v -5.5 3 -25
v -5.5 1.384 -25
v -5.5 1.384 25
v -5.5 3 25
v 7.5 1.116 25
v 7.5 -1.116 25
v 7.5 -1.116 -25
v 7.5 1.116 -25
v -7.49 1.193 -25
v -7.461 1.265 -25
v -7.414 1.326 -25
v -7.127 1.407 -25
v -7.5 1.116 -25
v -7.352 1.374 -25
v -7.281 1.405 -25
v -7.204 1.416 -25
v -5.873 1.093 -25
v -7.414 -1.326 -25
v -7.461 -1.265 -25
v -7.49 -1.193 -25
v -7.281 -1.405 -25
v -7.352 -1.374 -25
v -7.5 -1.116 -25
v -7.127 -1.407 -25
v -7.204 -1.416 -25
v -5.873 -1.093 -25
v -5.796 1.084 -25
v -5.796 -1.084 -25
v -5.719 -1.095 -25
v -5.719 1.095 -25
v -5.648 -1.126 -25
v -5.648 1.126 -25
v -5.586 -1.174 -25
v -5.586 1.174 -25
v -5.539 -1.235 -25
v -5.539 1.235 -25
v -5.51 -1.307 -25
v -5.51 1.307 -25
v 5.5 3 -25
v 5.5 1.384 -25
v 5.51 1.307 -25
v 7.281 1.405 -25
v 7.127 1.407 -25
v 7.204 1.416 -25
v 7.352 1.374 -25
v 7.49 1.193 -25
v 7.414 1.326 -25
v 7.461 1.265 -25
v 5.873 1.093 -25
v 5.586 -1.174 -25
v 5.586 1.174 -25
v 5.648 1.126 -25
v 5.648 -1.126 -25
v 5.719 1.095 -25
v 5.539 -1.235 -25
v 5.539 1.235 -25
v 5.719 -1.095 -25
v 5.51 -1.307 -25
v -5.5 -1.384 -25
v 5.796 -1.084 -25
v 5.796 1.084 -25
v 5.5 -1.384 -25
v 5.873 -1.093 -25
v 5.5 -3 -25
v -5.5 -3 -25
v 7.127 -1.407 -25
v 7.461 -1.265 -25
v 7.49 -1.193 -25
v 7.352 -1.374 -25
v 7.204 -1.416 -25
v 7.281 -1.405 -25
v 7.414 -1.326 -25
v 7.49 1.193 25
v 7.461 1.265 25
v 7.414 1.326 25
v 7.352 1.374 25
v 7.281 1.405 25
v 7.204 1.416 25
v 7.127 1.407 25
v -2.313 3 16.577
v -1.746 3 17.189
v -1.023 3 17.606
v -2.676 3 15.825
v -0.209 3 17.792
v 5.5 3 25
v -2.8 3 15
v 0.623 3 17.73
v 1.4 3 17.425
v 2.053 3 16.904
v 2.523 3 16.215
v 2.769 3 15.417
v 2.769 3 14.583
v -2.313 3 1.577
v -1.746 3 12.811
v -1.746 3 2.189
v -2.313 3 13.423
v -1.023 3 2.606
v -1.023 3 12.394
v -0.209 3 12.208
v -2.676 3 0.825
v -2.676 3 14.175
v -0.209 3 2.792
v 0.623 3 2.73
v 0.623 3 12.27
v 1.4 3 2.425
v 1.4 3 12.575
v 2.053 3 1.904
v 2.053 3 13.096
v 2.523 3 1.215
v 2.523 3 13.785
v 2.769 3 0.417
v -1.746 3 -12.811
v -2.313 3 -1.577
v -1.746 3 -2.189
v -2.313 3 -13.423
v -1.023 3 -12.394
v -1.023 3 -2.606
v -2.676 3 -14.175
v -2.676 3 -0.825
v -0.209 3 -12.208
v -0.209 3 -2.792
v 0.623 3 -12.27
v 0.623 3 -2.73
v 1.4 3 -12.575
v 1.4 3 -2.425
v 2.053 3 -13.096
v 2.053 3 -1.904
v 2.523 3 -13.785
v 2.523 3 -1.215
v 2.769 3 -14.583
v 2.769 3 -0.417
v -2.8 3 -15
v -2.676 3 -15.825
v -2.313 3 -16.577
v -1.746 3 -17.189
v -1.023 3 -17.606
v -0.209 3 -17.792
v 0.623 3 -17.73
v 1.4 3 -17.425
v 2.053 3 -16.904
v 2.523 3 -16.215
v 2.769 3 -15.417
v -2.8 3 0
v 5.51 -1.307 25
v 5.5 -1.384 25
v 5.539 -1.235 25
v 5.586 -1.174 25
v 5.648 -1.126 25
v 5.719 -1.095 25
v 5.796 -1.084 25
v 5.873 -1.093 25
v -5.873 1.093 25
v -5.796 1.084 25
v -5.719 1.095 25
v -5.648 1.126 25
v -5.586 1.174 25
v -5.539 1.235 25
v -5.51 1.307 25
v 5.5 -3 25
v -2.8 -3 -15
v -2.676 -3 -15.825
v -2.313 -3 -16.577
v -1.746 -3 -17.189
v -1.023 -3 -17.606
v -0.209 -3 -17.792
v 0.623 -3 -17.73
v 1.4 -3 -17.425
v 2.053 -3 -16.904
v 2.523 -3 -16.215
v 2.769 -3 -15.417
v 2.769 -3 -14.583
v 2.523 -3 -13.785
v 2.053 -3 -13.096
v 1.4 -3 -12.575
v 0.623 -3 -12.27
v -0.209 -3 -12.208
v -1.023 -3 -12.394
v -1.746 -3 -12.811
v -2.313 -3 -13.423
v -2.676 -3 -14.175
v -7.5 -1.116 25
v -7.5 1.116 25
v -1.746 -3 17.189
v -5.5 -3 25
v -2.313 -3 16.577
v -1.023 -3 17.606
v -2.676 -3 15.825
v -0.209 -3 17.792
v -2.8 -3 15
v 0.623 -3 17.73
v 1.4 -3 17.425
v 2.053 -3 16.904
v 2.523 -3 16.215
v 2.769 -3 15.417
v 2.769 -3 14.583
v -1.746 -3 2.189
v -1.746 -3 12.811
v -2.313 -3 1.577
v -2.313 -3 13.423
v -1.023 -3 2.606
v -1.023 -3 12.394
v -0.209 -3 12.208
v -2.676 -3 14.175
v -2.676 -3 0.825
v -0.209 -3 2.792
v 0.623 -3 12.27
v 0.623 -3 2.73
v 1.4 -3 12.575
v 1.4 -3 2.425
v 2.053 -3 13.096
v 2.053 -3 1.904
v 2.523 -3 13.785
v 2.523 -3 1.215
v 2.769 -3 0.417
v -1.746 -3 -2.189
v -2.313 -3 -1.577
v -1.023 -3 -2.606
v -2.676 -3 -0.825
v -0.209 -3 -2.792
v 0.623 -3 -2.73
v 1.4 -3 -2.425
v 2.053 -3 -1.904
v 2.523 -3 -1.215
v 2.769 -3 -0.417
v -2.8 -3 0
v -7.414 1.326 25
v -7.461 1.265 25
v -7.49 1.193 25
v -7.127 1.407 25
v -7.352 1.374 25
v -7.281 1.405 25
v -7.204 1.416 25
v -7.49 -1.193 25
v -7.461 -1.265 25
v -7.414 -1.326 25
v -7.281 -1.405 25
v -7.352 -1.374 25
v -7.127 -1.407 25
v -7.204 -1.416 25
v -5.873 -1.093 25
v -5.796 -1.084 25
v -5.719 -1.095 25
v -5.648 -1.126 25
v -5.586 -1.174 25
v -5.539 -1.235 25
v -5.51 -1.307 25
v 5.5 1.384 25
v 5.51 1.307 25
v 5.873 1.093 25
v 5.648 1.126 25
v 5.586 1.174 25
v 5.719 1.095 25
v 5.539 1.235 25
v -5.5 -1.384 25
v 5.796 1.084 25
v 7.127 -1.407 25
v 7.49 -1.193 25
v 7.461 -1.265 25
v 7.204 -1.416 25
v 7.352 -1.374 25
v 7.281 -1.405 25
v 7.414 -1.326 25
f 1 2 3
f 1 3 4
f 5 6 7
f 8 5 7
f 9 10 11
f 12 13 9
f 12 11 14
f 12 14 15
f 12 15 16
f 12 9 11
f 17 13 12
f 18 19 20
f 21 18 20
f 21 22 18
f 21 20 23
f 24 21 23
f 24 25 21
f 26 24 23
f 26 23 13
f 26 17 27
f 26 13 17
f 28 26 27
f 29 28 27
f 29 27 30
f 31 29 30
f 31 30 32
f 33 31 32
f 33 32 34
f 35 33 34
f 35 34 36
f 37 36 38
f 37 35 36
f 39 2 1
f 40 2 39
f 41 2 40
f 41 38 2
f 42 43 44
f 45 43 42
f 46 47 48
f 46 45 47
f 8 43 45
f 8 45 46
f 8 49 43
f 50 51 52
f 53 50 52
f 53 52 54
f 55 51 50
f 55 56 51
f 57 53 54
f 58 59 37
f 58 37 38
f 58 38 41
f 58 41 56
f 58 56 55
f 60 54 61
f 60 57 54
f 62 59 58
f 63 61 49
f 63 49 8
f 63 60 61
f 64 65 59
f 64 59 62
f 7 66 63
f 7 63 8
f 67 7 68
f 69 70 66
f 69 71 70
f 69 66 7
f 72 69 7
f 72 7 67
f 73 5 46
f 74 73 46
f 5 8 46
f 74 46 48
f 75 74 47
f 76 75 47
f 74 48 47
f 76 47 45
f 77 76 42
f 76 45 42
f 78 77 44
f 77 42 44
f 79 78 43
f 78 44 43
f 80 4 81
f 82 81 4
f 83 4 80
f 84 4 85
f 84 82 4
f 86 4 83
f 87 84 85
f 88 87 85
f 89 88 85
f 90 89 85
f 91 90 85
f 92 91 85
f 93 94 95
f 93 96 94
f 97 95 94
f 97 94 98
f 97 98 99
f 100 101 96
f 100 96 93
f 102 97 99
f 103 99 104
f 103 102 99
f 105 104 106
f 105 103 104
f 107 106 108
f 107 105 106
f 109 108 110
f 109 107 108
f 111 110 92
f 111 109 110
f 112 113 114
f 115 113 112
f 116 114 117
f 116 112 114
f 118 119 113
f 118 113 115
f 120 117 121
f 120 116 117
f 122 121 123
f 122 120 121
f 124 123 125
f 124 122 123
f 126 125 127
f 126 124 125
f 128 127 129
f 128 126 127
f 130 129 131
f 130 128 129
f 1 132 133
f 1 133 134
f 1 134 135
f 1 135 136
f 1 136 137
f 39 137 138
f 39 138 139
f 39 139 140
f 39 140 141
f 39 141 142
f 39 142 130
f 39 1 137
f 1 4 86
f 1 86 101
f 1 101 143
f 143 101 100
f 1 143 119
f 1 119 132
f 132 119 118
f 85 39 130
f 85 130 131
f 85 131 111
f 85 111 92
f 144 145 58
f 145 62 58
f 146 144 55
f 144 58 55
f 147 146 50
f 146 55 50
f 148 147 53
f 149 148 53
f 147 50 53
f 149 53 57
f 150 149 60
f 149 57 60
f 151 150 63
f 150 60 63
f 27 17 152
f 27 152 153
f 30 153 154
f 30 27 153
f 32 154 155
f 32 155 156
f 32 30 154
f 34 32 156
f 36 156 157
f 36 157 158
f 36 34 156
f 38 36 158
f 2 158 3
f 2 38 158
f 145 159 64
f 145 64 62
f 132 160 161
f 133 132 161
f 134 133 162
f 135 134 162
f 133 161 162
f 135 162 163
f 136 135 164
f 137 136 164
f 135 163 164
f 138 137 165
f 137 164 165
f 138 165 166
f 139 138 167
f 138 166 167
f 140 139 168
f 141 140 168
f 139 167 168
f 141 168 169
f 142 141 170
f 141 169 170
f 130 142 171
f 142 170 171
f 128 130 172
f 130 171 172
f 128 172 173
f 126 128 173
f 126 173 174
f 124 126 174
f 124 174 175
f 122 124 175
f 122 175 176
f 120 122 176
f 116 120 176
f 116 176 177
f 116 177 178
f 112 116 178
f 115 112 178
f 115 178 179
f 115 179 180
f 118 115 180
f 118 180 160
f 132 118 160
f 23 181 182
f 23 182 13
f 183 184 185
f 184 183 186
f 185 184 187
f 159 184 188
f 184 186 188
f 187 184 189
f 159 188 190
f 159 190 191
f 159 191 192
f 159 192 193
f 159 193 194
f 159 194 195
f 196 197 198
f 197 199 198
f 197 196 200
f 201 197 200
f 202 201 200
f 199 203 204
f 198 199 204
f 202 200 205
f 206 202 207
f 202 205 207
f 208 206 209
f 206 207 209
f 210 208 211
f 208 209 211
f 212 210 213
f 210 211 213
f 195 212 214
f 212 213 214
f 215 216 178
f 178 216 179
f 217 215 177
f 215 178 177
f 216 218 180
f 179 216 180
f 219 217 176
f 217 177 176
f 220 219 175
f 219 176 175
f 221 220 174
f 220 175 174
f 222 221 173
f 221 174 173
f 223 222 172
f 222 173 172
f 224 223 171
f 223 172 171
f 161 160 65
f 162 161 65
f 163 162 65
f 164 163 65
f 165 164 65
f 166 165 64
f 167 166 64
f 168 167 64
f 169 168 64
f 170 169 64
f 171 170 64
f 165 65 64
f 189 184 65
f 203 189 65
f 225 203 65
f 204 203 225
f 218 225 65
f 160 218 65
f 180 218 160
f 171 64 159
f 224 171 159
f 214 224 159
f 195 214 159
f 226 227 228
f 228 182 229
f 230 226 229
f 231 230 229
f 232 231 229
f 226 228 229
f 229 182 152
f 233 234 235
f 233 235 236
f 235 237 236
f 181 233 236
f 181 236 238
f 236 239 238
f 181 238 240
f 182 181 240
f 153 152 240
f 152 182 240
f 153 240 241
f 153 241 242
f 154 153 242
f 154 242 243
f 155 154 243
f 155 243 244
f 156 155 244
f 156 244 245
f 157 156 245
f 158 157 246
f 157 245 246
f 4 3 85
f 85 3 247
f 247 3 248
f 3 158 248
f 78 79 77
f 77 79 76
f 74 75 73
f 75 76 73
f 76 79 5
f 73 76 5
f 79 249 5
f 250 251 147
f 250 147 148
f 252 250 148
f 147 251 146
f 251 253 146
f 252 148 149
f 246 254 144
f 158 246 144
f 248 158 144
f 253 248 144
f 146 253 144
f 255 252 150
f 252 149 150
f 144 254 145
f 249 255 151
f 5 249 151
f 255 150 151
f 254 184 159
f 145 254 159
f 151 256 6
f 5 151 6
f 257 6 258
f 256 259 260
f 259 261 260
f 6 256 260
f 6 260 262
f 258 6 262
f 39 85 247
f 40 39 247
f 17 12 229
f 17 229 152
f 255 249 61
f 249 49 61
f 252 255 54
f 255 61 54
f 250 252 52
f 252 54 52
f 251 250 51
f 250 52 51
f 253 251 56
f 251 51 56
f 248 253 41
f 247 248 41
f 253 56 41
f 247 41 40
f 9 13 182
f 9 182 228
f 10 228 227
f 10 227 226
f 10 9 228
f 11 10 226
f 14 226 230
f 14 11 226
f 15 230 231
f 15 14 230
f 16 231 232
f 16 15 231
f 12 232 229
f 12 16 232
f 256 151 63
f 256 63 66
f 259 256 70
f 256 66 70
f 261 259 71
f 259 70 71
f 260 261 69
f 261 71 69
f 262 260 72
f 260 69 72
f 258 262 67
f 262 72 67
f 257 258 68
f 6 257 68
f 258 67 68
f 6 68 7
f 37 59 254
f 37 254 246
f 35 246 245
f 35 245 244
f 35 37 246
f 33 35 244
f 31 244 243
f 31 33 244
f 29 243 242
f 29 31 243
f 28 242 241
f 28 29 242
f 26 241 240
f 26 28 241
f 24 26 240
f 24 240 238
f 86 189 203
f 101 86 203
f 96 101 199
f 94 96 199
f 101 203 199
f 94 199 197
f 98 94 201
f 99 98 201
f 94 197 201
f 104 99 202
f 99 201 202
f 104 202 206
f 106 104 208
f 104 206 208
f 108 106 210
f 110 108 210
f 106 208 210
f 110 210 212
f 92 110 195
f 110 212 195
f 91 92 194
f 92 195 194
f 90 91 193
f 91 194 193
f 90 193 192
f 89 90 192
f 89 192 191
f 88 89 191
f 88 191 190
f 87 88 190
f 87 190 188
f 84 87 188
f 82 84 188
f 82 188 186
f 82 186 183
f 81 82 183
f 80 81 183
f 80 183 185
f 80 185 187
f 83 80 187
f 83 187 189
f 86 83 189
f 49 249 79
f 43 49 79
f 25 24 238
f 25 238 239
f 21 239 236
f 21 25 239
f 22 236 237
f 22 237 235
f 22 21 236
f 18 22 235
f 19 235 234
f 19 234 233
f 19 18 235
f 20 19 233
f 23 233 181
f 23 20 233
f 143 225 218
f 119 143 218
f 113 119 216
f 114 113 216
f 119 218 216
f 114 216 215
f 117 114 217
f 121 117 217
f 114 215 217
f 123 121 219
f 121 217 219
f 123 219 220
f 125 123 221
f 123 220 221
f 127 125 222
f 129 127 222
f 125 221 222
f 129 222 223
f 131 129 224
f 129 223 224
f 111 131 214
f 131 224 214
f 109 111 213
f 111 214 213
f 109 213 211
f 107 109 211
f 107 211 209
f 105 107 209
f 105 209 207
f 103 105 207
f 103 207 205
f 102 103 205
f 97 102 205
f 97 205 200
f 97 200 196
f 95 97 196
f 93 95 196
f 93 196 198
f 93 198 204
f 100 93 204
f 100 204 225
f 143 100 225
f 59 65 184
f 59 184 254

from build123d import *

# Parameters (mm, degrees)
SALIENTE_EXTRUIR1_DEPTH      = 3
SALIENTE_EXTRUIR1_DEPTH_BACK = 3
CROQUIS1_W                   = 15
CROQUIS1_H                   = 50
TALADRO1_D                   = 5.6
CORTAR_EXTRUIR2_DEPTH        = 27.272609311
REDONDEO1_R                  = 0.3
REDONDEO1_OF_SIMETR_A1_R     = 0.3
SIMETR_A2_START              = -25
SIMETR_A2_DEPTH              = 50


# Read off the part's stored shape, not the designer's step: Simetría2
with BuildPart() as part:
    # Croquis1 → Saliente-Extruir1 (new, two sides: drawn at the far end of the back side and taken through both)
    with BuildSketch(Plane(origin=(0, 0, 0), x_dir=(1, 0, 0), z_dir=(0, 1, 0)).offset(-SALIENTE_EXTRUIR1_DEPTH_BACK)):
        Rectangle(CROQUIS1_W, CROQUIS1_H)
    extrude(amount=SALIENTE_EXTRUIR1_DEPTH + SALIENTE_EXTRUIR1_DEPTH_BACK)

    # Taladro1 (through all)
    with Locations(Plane(origin=(0, 3, 0), x_dir=(1, 0, 0), z_dir=(0, 1, 0))):
        with Locations((0, 15), (0, -15), (0, 0)):
            Hole(TALADRO1_D / 2)

    # Croquis5 → Cortar-Extruir2 (cut, symmetric)
    with BuildSketch(Plane.XY):
        Polygon((5.5, -3), (5.5, -1), (7.5, -1.5), (7.5, -3), align=None)
    cortar_extruir2 = extrude(amount=CORTAR_EXTRUIR2_DEPTH, both=True, mode=Mode.SUBTRACT)

    # Redondeo1
    redondeo1_edges = [part.edges().sort_by_distance(p)[0] for p in [
        (5.5, -1, 0),
        (7.5, -1.5, 0),
    ]]
    fillet(redondeo1_edges, radius=REDONDEO1_R)

    # Simetría1: Cortar-Extruir2 across plane
    add(cortar_extruir2.mirror(Plane.ZX), mode=Mode.SUBTRACT)

    # Redondeo1 of Simetría1
    redondeo1_of_simetr_a1_edges = [part.edges().sort_by_distance(p)[0] for p in [
        (5.5, 1, 0),
        (7.5, 1.5, 0),
    ]]
    fillet(redondeo1_of_simetr_a1_edges, radius=REDONDEO1_OF_SIMETR_A1_R)

    # Simetría2 outline → Simetría2 (cut)
    with BuildSketch(Plane.XY.offset(SIMETR_A2_START)):
        with BuildLine():
            Line((-7.5, -3), (-5.5, -3))
            Line((-5.5, -3), (-5.5, -1.384232922))
            ThreePointArc((-5.5, -1.384232922), (-5.615376338, -1.147771291), (-5.872760688, -1.093190172))
            Line((-5.872760688, -1.093190172), (-7.127239312, -1.406809828))
            ThreePointArc((-7.127239312, -1.406809828), (-7.384623662, -1.352228709), (-7.5, -1.115767078))
            Line((-7.5, -1.115767078), (-7.5, -3))
        make_face()
        with BuildLine():
            Line((-7.5, 3), (-7.5, 1.115767078))
            ThreePointArc((-7.5, 1.115767078), (-7.384623662, 1.352228709), (-7.127239312, 1.406809828))
            Line((-7.127239312, 1.406809828), (-5.872760688, 1.093190172))
            ThreePointArc((-5.872760688, 1.093190172), (-5.615376338, 1.147771291), (-5.5, 1.384232922))
            Line((-5.5, 1.384232922), (-5.5, 3))
            Line((-5.5, 3), (-7.5, 3))
        make_face()
    extrude(amount=SIMETR_A2_DEPTH, mode=Mode.SUBTRACT)


solid = part.part
